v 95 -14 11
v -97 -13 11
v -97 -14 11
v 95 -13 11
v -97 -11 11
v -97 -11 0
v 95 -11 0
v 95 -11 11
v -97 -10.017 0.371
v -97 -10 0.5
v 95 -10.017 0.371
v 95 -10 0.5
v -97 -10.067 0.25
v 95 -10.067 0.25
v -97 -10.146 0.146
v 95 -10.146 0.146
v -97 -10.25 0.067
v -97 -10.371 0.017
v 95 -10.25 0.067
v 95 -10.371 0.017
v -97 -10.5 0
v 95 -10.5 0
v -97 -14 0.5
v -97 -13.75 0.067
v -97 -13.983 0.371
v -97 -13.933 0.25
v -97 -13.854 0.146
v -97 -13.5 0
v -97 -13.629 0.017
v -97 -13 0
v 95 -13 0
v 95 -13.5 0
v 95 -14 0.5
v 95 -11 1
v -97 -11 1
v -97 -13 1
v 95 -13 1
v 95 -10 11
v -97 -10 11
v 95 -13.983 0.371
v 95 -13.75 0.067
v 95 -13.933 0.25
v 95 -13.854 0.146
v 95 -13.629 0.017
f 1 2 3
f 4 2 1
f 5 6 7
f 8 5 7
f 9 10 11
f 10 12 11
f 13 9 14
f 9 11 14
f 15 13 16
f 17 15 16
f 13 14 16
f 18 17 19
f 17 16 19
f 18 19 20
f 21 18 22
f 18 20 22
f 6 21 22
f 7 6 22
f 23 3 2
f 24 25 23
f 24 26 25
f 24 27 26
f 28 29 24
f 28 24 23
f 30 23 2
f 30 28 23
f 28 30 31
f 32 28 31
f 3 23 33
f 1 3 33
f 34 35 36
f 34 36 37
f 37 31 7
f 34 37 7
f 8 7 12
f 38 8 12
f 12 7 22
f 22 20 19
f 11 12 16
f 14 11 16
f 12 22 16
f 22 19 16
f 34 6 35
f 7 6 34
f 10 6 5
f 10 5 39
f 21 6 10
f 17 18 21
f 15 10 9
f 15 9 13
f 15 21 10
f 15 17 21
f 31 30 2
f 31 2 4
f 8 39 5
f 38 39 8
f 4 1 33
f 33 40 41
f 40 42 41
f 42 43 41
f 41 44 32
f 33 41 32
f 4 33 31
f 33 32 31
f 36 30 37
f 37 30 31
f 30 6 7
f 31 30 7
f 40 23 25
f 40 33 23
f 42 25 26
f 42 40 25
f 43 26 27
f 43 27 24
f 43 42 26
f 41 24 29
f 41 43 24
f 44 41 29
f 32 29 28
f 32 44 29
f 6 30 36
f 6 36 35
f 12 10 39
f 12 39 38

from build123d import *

# Parameters (mm, degrees)
F0_W     = 192
F0_H     = 1
F1_DEPTH = 11
F0_H_2   = 2
F2_DEPTH = 1
F3_R     = 0.5


with BuildPart() as f1:
    # F0 (on Top) → F1 (new body)
    with BuildSketch(Plane.XY):
        with Locations((-1, -10.5)):
            Rectangle(F0_W, F0_H)
        with Locations((-1, -13.5)):
            Rectangle(F0_W, F0_H)
    extrude(amount=F1_DEPTH)

    # F3
    f3_edges = [f1.edges().sort_by_distance(p)[0] for p in [
        (-1, -14, 0),
        (-1, -10, 0),
    ]]
    fillet(f3_edges, radius=F3_R)


with BuildPart() as f2:
    # F0 (on Top) → F2 (new body)
    with BuildSketch(Plane.XY):
        with Locations((-1, -12)):
            Rectangle(F0_W, F0_H_2)
    extrude(amount=F2_DEPTH)


solid = Compound([f1.part, f2.part])
